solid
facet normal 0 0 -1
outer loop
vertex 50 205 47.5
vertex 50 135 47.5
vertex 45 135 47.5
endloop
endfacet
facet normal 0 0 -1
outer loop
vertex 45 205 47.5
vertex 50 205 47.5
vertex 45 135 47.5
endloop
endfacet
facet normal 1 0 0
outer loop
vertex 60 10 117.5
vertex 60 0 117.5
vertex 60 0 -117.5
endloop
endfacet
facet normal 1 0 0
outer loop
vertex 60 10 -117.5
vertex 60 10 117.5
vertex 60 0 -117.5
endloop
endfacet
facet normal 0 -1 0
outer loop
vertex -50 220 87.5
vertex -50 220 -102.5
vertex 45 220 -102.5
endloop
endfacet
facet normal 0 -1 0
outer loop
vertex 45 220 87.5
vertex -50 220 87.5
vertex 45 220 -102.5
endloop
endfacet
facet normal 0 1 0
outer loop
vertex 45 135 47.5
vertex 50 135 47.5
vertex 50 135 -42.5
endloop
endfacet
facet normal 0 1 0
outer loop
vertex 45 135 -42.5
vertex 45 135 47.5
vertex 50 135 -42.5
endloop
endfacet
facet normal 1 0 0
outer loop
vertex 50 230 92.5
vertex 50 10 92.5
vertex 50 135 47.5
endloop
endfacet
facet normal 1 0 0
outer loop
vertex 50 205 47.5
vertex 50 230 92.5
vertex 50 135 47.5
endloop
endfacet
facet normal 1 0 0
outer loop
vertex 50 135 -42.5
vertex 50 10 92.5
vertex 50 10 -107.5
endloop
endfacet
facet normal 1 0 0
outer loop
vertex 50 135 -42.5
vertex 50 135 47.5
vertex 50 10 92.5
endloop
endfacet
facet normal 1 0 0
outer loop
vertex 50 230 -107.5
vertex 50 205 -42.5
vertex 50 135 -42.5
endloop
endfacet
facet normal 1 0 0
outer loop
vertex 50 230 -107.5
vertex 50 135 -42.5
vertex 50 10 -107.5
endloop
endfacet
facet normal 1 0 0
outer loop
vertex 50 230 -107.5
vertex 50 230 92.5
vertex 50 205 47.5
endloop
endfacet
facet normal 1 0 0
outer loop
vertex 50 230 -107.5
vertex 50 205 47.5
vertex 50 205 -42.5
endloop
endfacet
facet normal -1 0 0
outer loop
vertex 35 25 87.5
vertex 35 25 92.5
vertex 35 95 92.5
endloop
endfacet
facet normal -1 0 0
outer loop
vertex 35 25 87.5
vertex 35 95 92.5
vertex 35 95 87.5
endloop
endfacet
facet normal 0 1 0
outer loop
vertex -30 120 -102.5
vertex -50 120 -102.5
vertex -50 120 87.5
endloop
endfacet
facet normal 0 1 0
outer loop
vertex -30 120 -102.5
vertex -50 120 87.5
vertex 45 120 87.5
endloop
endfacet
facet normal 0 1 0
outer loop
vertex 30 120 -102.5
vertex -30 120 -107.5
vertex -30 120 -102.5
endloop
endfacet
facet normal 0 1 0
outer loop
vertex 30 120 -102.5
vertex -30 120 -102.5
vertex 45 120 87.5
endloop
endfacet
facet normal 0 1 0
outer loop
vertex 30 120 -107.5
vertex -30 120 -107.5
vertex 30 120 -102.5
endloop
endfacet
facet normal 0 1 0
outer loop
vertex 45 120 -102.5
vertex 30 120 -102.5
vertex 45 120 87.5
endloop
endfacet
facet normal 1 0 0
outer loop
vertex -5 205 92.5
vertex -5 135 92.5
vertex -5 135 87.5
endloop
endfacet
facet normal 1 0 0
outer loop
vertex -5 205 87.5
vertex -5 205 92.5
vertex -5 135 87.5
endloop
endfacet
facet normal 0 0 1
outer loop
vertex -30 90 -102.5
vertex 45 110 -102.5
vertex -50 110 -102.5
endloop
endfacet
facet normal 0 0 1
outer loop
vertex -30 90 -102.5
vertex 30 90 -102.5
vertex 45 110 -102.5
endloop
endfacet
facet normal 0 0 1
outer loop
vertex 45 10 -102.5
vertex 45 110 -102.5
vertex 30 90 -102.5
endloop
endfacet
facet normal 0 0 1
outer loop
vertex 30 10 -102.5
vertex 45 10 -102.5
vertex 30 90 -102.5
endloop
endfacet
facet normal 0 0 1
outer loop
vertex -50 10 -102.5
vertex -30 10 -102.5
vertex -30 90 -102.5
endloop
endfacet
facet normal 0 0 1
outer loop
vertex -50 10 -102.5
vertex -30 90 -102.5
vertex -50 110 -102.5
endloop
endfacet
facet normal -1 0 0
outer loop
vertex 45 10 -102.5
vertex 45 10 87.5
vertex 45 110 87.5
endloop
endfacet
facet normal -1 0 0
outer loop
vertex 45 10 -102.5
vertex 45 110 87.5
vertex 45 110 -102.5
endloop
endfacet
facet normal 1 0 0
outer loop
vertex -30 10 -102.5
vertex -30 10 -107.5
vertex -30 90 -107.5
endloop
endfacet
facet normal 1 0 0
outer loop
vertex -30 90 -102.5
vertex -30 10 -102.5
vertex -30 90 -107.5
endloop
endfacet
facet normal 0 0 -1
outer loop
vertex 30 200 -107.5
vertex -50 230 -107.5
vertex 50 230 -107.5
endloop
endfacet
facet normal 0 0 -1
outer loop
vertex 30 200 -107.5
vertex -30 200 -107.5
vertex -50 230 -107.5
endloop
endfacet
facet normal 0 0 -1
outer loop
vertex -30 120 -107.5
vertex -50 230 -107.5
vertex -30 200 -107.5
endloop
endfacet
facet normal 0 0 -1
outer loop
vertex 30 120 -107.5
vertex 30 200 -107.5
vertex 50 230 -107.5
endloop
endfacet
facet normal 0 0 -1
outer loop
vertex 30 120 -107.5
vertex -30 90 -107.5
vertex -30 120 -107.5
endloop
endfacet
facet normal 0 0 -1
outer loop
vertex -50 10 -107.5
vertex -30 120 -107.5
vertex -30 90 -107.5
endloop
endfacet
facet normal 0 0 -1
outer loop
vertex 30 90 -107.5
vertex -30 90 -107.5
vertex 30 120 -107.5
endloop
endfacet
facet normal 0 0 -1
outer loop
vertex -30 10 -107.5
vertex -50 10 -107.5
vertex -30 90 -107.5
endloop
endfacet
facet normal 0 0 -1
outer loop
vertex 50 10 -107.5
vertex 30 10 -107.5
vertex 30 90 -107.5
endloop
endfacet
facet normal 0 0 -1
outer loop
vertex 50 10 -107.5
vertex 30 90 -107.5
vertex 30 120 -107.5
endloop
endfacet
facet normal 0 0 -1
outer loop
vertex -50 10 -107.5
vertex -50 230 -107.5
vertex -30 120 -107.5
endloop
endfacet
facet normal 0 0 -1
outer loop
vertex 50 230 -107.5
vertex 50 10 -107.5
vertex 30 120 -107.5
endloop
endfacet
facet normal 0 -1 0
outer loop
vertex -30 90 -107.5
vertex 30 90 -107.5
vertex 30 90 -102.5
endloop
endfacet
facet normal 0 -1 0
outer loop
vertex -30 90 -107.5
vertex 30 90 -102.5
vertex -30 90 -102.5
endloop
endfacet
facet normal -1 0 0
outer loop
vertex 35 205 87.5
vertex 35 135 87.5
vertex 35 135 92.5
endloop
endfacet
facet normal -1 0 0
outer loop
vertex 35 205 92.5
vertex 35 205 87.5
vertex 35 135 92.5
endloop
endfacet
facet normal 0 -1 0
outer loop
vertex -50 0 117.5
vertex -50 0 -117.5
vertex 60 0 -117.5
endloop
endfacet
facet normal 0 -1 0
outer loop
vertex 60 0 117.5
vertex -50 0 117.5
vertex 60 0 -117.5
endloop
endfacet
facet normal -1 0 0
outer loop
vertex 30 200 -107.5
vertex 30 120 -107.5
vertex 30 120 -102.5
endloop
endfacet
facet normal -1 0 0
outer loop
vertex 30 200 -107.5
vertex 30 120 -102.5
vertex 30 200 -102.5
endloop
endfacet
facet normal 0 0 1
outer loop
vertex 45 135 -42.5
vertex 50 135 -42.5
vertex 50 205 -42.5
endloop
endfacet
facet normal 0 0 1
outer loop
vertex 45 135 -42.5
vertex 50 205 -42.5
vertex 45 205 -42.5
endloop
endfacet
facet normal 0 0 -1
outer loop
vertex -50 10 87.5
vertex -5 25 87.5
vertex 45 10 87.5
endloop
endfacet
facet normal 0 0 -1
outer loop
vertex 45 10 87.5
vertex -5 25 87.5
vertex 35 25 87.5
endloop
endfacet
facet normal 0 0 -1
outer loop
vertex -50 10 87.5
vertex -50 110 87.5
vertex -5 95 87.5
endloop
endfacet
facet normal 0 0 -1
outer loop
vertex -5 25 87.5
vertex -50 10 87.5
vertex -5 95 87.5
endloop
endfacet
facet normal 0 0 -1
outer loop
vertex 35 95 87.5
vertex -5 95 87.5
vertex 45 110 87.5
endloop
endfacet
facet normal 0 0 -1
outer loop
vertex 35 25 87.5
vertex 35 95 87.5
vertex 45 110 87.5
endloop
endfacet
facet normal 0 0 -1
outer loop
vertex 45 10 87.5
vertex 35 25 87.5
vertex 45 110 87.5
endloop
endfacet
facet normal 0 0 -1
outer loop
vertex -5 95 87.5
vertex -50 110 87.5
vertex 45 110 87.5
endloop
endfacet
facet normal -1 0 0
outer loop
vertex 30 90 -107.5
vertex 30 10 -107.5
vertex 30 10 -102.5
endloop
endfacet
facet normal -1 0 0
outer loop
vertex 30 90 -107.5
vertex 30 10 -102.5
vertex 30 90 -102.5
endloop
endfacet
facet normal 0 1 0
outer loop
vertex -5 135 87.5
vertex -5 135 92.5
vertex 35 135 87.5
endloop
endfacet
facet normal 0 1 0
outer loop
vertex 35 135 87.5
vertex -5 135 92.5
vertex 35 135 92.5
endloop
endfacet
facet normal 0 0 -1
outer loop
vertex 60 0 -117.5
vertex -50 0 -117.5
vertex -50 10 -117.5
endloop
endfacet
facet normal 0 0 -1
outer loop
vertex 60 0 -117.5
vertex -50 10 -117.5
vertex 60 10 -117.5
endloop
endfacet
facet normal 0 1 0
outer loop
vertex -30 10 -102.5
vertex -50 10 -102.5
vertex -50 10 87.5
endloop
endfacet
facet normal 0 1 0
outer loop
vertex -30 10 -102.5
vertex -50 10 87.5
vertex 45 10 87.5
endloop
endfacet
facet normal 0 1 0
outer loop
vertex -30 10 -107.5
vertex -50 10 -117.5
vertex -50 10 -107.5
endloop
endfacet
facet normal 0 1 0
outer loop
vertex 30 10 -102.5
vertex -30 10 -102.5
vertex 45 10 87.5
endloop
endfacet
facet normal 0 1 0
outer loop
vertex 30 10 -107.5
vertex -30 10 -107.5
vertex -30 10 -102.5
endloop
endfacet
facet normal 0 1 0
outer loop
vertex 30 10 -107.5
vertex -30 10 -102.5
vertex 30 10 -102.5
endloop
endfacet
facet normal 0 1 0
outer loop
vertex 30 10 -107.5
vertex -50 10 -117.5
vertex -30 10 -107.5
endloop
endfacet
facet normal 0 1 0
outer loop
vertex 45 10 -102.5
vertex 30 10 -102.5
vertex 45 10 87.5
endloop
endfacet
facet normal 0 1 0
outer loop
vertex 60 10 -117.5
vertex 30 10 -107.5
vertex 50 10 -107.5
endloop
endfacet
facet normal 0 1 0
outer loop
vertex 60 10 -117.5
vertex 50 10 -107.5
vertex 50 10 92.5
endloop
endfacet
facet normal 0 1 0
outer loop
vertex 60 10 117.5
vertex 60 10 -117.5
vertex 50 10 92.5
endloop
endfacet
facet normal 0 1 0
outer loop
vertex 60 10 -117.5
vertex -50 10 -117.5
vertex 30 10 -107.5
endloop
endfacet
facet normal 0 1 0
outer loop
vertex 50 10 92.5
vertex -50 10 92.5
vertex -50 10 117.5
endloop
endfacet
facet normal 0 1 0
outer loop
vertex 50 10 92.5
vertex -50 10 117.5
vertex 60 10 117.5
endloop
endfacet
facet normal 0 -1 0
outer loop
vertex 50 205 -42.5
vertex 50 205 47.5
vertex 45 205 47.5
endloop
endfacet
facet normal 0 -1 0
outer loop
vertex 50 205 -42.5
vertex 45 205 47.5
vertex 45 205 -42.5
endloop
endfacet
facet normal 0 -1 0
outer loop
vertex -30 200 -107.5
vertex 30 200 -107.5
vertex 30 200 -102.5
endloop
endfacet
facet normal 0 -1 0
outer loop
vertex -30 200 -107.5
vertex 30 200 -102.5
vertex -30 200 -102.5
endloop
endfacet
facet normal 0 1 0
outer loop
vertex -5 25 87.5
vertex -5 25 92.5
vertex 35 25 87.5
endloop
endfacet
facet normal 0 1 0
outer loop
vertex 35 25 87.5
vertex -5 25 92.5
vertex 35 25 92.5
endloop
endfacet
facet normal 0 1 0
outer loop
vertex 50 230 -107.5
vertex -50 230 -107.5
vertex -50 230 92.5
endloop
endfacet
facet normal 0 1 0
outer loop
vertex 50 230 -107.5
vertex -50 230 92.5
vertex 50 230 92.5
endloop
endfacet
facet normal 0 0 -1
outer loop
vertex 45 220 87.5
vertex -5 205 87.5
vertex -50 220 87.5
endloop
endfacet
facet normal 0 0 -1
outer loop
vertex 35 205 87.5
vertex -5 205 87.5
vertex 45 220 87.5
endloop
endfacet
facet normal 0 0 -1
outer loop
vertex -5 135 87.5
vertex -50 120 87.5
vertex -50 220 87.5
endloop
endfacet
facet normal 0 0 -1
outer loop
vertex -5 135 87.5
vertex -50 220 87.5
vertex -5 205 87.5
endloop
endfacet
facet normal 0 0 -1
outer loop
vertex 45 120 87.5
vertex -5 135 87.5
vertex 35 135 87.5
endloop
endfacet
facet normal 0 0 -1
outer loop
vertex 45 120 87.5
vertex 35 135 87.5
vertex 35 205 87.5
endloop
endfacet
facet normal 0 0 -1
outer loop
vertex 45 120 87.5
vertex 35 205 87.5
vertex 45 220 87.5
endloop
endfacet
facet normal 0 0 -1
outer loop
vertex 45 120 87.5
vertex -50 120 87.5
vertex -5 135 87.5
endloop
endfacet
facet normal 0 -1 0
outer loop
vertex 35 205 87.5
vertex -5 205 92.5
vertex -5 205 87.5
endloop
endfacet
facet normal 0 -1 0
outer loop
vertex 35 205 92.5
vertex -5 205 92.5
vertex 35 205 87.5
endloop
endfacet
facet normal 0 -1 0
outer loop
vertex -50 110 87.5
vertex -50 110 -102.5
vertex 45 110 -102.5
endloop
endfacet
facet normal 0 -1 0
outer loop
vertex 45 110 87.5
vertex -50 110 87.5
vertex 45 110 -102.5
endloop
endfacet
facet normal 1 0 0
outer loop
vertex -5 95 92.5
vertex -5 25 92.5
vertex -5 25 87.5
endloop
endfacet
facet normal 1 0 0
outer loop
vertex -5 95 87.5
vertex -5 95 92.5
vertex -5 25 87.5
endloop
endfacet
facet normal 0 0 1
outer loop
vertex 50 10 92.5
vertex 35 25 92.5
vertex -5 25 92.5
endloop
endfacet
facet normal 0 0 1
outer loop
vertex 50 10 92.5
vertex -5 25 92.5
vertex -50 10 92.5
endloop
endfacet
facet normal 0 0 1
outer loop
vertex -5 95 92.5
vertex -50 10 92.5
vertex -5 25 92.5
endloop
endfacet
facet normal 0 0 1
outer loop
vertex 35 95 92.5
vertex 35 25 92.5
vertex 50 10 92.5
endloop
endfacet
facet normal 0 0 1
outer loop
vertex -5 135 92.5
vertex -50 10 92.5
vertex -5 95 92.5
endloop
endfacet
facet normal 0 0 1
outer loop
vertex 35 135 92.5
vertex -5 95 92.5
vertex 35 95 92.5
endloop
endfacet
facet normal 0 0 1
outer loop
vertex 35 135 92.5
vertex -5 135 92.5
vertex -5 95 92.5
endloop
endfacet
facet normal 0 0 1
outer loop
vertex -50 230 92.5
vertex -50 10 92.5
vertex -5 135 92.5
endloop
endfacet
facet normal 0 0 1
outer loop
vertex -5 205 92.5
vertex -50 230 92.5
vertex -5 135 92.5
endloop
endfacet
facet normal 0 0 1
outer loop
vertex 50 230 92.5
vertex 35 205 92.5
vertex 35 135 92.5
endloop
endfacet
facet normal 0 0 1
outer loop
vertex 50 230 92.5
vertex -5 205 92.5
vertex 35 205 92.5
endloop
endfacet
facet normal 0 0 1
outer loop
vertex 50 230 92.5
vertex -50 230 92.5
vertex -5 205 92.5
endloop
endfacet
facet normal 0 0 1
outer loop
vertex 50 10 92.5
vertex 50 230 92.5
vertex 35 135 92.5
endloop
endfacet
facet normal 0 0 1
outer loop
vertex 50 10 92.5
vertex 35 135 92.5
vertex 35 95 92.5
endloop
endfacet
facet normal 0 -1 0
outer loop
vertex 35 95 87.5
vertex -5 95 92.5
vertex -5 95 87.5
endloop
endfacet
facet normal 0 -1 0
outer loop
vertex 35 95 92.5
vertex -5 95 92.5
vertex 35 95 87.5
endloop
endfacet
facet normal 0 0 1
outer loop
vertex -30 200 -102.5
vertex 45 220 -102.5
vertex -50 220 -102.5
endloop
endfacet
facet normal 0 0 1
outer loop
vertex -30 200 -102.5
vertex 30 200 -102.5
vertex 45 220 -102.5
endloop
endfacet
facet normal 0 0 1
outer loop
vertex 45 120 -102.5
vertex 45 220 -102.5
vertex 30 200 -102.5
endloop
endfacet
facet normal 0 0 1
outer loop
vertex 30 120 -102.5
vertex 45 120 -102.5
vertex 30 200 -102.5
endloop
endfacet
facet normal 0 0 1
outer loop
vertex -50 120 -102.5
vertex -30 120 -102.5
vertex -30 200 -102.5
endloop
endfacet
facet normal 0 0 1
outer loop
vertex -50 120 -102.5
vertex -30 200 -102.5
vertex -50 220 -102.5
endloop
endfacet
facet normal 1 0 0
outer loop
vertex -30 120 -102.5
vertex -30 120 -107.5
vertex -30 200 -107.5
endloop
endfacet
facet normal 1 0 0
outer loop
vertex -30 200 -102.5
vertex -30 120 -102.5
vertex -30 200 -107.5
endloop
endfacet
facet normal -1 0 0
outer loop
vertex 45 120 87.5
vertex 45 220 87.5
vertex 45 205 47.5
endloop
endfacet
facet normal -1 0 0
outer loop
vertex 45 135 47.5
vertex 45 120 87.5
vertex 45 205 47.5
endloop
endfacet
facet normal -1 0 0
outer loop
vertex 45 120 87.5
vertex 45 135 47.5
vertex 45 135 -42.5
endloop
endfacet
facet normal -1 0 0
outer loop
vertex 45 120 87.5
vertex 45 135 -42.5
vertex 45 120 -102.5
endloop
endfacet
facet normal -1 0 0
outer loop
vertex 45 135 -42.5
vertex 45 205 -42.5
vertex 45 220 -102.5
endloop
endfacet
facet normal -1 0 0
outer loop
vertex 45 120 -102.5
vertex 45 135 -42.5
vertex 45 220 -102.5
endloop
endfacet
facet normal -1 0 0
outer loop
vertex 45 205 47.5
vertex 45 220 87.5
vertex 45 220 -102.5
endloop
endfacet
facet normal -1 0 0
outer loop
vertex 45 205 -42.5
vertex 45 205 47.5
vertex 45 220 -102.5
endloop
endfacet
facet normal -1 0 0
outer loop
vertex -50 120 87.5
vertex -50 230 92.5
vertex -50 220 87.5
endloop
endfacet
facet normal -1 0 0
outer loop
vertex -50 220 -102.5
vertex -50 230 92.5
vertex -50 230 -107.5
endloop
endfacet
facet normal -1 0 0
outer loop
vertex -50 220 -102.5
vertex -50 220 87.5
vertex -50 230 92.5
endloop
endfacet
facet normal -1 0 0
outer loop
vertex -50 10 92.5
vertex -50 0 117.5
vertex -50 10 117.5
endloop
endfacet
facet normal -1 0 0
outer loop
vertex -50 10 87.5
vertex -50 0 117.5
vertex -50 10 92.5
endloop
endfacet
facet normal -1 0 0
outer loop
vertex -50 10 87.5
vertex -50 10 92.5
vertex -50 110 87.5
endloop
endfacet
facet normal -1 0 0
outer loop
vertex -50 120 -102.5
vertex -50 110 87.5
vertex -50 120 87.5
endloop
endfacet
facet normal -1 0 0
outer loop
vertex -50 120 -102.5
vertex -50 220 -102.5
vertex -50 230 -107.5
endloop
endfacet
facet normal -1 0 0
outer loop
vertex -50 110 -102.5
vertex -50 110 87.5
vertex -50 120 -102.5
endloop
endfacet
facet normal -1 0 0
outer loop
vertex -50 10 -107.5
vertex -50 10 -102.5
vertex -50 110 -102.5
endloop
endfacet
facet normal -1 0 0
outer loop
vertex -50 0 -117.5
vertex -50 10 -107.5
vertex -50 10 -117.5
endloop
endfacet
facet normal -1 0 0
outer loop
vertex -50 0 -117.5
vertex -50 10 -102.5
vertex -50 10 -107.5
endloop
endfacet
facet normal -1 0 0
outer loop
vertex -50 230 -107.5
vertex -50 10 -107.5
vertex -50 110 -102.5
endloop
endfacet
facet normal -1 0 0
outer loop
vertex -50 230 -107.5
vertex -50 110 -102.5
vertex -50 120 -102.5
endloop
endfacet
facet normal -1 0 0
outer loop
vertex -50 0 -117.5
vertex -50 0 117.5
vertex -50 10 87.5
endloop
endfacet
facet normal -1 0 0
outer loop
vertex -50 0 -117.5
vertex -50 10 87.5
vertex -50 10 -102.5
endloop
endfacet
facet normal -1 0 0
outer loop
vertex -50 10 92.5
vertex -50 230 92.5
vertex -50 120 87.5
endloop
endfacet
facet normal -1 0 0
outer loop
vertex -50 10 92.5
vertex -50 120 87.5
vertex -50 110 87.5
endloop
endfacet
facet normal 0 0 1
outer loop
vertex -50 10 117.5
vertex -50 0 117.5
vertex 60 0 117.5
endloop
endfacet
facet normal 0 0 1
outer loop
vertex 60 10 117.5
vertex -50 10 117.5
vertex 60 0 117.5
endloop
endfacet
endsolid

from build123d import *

# Parameters (mm, degrees)
SKETCH1_W           = 120
SKETCH1_H           = 235
FLOOR_2_DEPTH       = 10
SKETCH2_W           = 45
SKETCH2_H           = 5
BOSS_EXTRUDE2_DEPTH = 100
SKETCH3_W           = 100
SKETCH3_H           = 200
BOSS_EXTRUDE3_DEPTH = 10
SKETCH4_W           = 45
SKETCH4_H           = 5
BOSS_EXTRUDE4_DEPTH = 100
SKETCH5_W           = 100
SKETCH5_H           = 200
BOSS_EXTRUDE5_DEPTH = 10
SKETCH6_W           = 40
SKETCH6_H           = 15
BOSS_EXTRUDE6_DEPTH = 5
SKETCH7_W           = 90
SKETCH7_H           = 15
BOSS_EXTRUDE7_DEPTH = 5
SKETCH8_W           = 60
SKETCH8_H           = 80
CUT_EXTRUDE1_DEPTH  = 5
SKETCH10_W          = 10
SKETCH10_H          = 235
CUT_EXTRUDE2_DEPTH  = 10


with BuildPart() as part:
    # Sketch1 → floor 2 (new body)
    with BuildSketch(Plane(origin=(0, 0, 0), x_dir=(1, 0, 0), z_dir=(0, 1, 0))):
        Rectangle(SKETCH1_W, SKETCH1_H)
    extrude(amount=FLOOR_2_DEPTH)

    # Sketch2 → Boss-Extrude2 (add)
    with BuildSketch(Plane(origin=(0, 10, 0), x_dir=(1, 0, 0), z_dir=(0, 1, 0))):
        Polygon((-50, 102.5), (-50, 107.5), (50, 107.5), (50, -92.5), (35, -92.5), (35, -87.5), (45, -87.5), (45, 102.5), align=None)
        with Locations((-27.5, -90)):
            Rectangle(SKETCH2_W, SKETCH2_H)
    extrude(amount=BOSS_EXTRUDE2_DEPTH)

    # Sketch3 → Boss-Extrude3 (add)
    with BuildSketch(Plane(origin=(0, 110, 0), x_dir=(1, 0, 0), z_dir=(0, 1, 0))):
        with Locations((0, 7.5)):
            Rectangle(SKETCH3_W, SKETCH3_H)
    extrude(amount=BOSS_EXTRUDE3_DEPTH)

    # Sketch4 → Boss-Extrude4 (add)
    with BuildSketch(Plane(origin=(0, 120, 0), x_dir=(1, 0, 0), z_dir=(0, 1, 0))):
        Polygon((-50, 102.5), (-50, 107.5), (50, 107.5), (50, 42.5), (45, 42.5), (45, 102.5), align=None)
        with Locations((-27.5, -90)):
            Rectangle(SKETCH4_W, SKETCH4_H)
        Polygon((35, -87.5), (35, -92.5), (50, -92.5), (50, -47.5), (45, -47.5), (45, -87.5), align=None)
    extrude(amount=BOSS_EXTRUDE4_DEPTH)

    # Sketch5 → Boss-Extrude5 (add)
    with BuildSketch(Plane(origin=(0, 220, 0), x_dir=(1, 0, 0), z_dir=(0, 1, 0))):
        with Locations((0, 7.5)):
            Rectangle(SKETCH5_W, SKETCH5_H)
    extrude(amount=BOSS_EXTRUDE5_DEPTH)

    # Sketch6 → Boss-Extrude6 (add)
    with BuildSketch(Plane.XY.offset(92.5)):
        with Locations((15, 17.5)):
            Rectangle(SKETCH6_W, SKETCH6_H)
        with Locations((15, 102.5)):
            Rectangle(SKETCH6_W, SKETCH6_H)
        with Locations((15, 127.5)):
            Rectangle(SKETCH6_W, SKETCH6_H)
        with Locations((15, 212.5)):
            Rectangle(SKETCH6_W, SKETCH6_H)
    extrude(amount=-BOSS_EXTRUDE6_DEPTH)

    # Sketch7 → Boss-Extrude7 (add)
    with BuildSketch(Plane(origin=(50, 0, 0), x_dir=(0, 0, -1), z_dir=(1, 0, 0))):
        with Locations((-2.5, 127.5)):
            Rectangle(SKETCH7_W, SKETCH7_H)
        with Locations((-2.5, 212.5)):
            Rectangle(SKETCH7_W, SKETCH7_H)
    extrude(amount=-BOSS_EXTRUDE7_DEPTH)

    # Sketch8 → Cut-Extrude1 (cut)
    with BuildSketch(Plane(origin=(0, 0, -107.5), x_dir=(-1, 0, 0), z_dir=(0, 0, -1))):
        with Locations((0, 50)):
            Rectangle(SKETCH8_W, SKETCH8_H)
        with Locations((0, 160)):
            Rectangle(SKETCH8_W, SKETCH8_H)
    extrude(amount=-CUT_EXTRUDE1_DEPTH, mode=Mode.SUBTRACT)

    # Sketch10 → Cut-Extrude2 (cut)
    with BuildSketch(Plane(origin=(0, 10, 0), x_dir=(1, 0, 0), z_dir=(0, 1, 0))):
        with Locations((-55, 0)):
            Rectangle(SKETCH10_W, SKETCH10_H)
    extrude(amount=-CUT_EXTRUDE2_DEPTH, mode=Mode.SUBTRACT)


solid = part.part
